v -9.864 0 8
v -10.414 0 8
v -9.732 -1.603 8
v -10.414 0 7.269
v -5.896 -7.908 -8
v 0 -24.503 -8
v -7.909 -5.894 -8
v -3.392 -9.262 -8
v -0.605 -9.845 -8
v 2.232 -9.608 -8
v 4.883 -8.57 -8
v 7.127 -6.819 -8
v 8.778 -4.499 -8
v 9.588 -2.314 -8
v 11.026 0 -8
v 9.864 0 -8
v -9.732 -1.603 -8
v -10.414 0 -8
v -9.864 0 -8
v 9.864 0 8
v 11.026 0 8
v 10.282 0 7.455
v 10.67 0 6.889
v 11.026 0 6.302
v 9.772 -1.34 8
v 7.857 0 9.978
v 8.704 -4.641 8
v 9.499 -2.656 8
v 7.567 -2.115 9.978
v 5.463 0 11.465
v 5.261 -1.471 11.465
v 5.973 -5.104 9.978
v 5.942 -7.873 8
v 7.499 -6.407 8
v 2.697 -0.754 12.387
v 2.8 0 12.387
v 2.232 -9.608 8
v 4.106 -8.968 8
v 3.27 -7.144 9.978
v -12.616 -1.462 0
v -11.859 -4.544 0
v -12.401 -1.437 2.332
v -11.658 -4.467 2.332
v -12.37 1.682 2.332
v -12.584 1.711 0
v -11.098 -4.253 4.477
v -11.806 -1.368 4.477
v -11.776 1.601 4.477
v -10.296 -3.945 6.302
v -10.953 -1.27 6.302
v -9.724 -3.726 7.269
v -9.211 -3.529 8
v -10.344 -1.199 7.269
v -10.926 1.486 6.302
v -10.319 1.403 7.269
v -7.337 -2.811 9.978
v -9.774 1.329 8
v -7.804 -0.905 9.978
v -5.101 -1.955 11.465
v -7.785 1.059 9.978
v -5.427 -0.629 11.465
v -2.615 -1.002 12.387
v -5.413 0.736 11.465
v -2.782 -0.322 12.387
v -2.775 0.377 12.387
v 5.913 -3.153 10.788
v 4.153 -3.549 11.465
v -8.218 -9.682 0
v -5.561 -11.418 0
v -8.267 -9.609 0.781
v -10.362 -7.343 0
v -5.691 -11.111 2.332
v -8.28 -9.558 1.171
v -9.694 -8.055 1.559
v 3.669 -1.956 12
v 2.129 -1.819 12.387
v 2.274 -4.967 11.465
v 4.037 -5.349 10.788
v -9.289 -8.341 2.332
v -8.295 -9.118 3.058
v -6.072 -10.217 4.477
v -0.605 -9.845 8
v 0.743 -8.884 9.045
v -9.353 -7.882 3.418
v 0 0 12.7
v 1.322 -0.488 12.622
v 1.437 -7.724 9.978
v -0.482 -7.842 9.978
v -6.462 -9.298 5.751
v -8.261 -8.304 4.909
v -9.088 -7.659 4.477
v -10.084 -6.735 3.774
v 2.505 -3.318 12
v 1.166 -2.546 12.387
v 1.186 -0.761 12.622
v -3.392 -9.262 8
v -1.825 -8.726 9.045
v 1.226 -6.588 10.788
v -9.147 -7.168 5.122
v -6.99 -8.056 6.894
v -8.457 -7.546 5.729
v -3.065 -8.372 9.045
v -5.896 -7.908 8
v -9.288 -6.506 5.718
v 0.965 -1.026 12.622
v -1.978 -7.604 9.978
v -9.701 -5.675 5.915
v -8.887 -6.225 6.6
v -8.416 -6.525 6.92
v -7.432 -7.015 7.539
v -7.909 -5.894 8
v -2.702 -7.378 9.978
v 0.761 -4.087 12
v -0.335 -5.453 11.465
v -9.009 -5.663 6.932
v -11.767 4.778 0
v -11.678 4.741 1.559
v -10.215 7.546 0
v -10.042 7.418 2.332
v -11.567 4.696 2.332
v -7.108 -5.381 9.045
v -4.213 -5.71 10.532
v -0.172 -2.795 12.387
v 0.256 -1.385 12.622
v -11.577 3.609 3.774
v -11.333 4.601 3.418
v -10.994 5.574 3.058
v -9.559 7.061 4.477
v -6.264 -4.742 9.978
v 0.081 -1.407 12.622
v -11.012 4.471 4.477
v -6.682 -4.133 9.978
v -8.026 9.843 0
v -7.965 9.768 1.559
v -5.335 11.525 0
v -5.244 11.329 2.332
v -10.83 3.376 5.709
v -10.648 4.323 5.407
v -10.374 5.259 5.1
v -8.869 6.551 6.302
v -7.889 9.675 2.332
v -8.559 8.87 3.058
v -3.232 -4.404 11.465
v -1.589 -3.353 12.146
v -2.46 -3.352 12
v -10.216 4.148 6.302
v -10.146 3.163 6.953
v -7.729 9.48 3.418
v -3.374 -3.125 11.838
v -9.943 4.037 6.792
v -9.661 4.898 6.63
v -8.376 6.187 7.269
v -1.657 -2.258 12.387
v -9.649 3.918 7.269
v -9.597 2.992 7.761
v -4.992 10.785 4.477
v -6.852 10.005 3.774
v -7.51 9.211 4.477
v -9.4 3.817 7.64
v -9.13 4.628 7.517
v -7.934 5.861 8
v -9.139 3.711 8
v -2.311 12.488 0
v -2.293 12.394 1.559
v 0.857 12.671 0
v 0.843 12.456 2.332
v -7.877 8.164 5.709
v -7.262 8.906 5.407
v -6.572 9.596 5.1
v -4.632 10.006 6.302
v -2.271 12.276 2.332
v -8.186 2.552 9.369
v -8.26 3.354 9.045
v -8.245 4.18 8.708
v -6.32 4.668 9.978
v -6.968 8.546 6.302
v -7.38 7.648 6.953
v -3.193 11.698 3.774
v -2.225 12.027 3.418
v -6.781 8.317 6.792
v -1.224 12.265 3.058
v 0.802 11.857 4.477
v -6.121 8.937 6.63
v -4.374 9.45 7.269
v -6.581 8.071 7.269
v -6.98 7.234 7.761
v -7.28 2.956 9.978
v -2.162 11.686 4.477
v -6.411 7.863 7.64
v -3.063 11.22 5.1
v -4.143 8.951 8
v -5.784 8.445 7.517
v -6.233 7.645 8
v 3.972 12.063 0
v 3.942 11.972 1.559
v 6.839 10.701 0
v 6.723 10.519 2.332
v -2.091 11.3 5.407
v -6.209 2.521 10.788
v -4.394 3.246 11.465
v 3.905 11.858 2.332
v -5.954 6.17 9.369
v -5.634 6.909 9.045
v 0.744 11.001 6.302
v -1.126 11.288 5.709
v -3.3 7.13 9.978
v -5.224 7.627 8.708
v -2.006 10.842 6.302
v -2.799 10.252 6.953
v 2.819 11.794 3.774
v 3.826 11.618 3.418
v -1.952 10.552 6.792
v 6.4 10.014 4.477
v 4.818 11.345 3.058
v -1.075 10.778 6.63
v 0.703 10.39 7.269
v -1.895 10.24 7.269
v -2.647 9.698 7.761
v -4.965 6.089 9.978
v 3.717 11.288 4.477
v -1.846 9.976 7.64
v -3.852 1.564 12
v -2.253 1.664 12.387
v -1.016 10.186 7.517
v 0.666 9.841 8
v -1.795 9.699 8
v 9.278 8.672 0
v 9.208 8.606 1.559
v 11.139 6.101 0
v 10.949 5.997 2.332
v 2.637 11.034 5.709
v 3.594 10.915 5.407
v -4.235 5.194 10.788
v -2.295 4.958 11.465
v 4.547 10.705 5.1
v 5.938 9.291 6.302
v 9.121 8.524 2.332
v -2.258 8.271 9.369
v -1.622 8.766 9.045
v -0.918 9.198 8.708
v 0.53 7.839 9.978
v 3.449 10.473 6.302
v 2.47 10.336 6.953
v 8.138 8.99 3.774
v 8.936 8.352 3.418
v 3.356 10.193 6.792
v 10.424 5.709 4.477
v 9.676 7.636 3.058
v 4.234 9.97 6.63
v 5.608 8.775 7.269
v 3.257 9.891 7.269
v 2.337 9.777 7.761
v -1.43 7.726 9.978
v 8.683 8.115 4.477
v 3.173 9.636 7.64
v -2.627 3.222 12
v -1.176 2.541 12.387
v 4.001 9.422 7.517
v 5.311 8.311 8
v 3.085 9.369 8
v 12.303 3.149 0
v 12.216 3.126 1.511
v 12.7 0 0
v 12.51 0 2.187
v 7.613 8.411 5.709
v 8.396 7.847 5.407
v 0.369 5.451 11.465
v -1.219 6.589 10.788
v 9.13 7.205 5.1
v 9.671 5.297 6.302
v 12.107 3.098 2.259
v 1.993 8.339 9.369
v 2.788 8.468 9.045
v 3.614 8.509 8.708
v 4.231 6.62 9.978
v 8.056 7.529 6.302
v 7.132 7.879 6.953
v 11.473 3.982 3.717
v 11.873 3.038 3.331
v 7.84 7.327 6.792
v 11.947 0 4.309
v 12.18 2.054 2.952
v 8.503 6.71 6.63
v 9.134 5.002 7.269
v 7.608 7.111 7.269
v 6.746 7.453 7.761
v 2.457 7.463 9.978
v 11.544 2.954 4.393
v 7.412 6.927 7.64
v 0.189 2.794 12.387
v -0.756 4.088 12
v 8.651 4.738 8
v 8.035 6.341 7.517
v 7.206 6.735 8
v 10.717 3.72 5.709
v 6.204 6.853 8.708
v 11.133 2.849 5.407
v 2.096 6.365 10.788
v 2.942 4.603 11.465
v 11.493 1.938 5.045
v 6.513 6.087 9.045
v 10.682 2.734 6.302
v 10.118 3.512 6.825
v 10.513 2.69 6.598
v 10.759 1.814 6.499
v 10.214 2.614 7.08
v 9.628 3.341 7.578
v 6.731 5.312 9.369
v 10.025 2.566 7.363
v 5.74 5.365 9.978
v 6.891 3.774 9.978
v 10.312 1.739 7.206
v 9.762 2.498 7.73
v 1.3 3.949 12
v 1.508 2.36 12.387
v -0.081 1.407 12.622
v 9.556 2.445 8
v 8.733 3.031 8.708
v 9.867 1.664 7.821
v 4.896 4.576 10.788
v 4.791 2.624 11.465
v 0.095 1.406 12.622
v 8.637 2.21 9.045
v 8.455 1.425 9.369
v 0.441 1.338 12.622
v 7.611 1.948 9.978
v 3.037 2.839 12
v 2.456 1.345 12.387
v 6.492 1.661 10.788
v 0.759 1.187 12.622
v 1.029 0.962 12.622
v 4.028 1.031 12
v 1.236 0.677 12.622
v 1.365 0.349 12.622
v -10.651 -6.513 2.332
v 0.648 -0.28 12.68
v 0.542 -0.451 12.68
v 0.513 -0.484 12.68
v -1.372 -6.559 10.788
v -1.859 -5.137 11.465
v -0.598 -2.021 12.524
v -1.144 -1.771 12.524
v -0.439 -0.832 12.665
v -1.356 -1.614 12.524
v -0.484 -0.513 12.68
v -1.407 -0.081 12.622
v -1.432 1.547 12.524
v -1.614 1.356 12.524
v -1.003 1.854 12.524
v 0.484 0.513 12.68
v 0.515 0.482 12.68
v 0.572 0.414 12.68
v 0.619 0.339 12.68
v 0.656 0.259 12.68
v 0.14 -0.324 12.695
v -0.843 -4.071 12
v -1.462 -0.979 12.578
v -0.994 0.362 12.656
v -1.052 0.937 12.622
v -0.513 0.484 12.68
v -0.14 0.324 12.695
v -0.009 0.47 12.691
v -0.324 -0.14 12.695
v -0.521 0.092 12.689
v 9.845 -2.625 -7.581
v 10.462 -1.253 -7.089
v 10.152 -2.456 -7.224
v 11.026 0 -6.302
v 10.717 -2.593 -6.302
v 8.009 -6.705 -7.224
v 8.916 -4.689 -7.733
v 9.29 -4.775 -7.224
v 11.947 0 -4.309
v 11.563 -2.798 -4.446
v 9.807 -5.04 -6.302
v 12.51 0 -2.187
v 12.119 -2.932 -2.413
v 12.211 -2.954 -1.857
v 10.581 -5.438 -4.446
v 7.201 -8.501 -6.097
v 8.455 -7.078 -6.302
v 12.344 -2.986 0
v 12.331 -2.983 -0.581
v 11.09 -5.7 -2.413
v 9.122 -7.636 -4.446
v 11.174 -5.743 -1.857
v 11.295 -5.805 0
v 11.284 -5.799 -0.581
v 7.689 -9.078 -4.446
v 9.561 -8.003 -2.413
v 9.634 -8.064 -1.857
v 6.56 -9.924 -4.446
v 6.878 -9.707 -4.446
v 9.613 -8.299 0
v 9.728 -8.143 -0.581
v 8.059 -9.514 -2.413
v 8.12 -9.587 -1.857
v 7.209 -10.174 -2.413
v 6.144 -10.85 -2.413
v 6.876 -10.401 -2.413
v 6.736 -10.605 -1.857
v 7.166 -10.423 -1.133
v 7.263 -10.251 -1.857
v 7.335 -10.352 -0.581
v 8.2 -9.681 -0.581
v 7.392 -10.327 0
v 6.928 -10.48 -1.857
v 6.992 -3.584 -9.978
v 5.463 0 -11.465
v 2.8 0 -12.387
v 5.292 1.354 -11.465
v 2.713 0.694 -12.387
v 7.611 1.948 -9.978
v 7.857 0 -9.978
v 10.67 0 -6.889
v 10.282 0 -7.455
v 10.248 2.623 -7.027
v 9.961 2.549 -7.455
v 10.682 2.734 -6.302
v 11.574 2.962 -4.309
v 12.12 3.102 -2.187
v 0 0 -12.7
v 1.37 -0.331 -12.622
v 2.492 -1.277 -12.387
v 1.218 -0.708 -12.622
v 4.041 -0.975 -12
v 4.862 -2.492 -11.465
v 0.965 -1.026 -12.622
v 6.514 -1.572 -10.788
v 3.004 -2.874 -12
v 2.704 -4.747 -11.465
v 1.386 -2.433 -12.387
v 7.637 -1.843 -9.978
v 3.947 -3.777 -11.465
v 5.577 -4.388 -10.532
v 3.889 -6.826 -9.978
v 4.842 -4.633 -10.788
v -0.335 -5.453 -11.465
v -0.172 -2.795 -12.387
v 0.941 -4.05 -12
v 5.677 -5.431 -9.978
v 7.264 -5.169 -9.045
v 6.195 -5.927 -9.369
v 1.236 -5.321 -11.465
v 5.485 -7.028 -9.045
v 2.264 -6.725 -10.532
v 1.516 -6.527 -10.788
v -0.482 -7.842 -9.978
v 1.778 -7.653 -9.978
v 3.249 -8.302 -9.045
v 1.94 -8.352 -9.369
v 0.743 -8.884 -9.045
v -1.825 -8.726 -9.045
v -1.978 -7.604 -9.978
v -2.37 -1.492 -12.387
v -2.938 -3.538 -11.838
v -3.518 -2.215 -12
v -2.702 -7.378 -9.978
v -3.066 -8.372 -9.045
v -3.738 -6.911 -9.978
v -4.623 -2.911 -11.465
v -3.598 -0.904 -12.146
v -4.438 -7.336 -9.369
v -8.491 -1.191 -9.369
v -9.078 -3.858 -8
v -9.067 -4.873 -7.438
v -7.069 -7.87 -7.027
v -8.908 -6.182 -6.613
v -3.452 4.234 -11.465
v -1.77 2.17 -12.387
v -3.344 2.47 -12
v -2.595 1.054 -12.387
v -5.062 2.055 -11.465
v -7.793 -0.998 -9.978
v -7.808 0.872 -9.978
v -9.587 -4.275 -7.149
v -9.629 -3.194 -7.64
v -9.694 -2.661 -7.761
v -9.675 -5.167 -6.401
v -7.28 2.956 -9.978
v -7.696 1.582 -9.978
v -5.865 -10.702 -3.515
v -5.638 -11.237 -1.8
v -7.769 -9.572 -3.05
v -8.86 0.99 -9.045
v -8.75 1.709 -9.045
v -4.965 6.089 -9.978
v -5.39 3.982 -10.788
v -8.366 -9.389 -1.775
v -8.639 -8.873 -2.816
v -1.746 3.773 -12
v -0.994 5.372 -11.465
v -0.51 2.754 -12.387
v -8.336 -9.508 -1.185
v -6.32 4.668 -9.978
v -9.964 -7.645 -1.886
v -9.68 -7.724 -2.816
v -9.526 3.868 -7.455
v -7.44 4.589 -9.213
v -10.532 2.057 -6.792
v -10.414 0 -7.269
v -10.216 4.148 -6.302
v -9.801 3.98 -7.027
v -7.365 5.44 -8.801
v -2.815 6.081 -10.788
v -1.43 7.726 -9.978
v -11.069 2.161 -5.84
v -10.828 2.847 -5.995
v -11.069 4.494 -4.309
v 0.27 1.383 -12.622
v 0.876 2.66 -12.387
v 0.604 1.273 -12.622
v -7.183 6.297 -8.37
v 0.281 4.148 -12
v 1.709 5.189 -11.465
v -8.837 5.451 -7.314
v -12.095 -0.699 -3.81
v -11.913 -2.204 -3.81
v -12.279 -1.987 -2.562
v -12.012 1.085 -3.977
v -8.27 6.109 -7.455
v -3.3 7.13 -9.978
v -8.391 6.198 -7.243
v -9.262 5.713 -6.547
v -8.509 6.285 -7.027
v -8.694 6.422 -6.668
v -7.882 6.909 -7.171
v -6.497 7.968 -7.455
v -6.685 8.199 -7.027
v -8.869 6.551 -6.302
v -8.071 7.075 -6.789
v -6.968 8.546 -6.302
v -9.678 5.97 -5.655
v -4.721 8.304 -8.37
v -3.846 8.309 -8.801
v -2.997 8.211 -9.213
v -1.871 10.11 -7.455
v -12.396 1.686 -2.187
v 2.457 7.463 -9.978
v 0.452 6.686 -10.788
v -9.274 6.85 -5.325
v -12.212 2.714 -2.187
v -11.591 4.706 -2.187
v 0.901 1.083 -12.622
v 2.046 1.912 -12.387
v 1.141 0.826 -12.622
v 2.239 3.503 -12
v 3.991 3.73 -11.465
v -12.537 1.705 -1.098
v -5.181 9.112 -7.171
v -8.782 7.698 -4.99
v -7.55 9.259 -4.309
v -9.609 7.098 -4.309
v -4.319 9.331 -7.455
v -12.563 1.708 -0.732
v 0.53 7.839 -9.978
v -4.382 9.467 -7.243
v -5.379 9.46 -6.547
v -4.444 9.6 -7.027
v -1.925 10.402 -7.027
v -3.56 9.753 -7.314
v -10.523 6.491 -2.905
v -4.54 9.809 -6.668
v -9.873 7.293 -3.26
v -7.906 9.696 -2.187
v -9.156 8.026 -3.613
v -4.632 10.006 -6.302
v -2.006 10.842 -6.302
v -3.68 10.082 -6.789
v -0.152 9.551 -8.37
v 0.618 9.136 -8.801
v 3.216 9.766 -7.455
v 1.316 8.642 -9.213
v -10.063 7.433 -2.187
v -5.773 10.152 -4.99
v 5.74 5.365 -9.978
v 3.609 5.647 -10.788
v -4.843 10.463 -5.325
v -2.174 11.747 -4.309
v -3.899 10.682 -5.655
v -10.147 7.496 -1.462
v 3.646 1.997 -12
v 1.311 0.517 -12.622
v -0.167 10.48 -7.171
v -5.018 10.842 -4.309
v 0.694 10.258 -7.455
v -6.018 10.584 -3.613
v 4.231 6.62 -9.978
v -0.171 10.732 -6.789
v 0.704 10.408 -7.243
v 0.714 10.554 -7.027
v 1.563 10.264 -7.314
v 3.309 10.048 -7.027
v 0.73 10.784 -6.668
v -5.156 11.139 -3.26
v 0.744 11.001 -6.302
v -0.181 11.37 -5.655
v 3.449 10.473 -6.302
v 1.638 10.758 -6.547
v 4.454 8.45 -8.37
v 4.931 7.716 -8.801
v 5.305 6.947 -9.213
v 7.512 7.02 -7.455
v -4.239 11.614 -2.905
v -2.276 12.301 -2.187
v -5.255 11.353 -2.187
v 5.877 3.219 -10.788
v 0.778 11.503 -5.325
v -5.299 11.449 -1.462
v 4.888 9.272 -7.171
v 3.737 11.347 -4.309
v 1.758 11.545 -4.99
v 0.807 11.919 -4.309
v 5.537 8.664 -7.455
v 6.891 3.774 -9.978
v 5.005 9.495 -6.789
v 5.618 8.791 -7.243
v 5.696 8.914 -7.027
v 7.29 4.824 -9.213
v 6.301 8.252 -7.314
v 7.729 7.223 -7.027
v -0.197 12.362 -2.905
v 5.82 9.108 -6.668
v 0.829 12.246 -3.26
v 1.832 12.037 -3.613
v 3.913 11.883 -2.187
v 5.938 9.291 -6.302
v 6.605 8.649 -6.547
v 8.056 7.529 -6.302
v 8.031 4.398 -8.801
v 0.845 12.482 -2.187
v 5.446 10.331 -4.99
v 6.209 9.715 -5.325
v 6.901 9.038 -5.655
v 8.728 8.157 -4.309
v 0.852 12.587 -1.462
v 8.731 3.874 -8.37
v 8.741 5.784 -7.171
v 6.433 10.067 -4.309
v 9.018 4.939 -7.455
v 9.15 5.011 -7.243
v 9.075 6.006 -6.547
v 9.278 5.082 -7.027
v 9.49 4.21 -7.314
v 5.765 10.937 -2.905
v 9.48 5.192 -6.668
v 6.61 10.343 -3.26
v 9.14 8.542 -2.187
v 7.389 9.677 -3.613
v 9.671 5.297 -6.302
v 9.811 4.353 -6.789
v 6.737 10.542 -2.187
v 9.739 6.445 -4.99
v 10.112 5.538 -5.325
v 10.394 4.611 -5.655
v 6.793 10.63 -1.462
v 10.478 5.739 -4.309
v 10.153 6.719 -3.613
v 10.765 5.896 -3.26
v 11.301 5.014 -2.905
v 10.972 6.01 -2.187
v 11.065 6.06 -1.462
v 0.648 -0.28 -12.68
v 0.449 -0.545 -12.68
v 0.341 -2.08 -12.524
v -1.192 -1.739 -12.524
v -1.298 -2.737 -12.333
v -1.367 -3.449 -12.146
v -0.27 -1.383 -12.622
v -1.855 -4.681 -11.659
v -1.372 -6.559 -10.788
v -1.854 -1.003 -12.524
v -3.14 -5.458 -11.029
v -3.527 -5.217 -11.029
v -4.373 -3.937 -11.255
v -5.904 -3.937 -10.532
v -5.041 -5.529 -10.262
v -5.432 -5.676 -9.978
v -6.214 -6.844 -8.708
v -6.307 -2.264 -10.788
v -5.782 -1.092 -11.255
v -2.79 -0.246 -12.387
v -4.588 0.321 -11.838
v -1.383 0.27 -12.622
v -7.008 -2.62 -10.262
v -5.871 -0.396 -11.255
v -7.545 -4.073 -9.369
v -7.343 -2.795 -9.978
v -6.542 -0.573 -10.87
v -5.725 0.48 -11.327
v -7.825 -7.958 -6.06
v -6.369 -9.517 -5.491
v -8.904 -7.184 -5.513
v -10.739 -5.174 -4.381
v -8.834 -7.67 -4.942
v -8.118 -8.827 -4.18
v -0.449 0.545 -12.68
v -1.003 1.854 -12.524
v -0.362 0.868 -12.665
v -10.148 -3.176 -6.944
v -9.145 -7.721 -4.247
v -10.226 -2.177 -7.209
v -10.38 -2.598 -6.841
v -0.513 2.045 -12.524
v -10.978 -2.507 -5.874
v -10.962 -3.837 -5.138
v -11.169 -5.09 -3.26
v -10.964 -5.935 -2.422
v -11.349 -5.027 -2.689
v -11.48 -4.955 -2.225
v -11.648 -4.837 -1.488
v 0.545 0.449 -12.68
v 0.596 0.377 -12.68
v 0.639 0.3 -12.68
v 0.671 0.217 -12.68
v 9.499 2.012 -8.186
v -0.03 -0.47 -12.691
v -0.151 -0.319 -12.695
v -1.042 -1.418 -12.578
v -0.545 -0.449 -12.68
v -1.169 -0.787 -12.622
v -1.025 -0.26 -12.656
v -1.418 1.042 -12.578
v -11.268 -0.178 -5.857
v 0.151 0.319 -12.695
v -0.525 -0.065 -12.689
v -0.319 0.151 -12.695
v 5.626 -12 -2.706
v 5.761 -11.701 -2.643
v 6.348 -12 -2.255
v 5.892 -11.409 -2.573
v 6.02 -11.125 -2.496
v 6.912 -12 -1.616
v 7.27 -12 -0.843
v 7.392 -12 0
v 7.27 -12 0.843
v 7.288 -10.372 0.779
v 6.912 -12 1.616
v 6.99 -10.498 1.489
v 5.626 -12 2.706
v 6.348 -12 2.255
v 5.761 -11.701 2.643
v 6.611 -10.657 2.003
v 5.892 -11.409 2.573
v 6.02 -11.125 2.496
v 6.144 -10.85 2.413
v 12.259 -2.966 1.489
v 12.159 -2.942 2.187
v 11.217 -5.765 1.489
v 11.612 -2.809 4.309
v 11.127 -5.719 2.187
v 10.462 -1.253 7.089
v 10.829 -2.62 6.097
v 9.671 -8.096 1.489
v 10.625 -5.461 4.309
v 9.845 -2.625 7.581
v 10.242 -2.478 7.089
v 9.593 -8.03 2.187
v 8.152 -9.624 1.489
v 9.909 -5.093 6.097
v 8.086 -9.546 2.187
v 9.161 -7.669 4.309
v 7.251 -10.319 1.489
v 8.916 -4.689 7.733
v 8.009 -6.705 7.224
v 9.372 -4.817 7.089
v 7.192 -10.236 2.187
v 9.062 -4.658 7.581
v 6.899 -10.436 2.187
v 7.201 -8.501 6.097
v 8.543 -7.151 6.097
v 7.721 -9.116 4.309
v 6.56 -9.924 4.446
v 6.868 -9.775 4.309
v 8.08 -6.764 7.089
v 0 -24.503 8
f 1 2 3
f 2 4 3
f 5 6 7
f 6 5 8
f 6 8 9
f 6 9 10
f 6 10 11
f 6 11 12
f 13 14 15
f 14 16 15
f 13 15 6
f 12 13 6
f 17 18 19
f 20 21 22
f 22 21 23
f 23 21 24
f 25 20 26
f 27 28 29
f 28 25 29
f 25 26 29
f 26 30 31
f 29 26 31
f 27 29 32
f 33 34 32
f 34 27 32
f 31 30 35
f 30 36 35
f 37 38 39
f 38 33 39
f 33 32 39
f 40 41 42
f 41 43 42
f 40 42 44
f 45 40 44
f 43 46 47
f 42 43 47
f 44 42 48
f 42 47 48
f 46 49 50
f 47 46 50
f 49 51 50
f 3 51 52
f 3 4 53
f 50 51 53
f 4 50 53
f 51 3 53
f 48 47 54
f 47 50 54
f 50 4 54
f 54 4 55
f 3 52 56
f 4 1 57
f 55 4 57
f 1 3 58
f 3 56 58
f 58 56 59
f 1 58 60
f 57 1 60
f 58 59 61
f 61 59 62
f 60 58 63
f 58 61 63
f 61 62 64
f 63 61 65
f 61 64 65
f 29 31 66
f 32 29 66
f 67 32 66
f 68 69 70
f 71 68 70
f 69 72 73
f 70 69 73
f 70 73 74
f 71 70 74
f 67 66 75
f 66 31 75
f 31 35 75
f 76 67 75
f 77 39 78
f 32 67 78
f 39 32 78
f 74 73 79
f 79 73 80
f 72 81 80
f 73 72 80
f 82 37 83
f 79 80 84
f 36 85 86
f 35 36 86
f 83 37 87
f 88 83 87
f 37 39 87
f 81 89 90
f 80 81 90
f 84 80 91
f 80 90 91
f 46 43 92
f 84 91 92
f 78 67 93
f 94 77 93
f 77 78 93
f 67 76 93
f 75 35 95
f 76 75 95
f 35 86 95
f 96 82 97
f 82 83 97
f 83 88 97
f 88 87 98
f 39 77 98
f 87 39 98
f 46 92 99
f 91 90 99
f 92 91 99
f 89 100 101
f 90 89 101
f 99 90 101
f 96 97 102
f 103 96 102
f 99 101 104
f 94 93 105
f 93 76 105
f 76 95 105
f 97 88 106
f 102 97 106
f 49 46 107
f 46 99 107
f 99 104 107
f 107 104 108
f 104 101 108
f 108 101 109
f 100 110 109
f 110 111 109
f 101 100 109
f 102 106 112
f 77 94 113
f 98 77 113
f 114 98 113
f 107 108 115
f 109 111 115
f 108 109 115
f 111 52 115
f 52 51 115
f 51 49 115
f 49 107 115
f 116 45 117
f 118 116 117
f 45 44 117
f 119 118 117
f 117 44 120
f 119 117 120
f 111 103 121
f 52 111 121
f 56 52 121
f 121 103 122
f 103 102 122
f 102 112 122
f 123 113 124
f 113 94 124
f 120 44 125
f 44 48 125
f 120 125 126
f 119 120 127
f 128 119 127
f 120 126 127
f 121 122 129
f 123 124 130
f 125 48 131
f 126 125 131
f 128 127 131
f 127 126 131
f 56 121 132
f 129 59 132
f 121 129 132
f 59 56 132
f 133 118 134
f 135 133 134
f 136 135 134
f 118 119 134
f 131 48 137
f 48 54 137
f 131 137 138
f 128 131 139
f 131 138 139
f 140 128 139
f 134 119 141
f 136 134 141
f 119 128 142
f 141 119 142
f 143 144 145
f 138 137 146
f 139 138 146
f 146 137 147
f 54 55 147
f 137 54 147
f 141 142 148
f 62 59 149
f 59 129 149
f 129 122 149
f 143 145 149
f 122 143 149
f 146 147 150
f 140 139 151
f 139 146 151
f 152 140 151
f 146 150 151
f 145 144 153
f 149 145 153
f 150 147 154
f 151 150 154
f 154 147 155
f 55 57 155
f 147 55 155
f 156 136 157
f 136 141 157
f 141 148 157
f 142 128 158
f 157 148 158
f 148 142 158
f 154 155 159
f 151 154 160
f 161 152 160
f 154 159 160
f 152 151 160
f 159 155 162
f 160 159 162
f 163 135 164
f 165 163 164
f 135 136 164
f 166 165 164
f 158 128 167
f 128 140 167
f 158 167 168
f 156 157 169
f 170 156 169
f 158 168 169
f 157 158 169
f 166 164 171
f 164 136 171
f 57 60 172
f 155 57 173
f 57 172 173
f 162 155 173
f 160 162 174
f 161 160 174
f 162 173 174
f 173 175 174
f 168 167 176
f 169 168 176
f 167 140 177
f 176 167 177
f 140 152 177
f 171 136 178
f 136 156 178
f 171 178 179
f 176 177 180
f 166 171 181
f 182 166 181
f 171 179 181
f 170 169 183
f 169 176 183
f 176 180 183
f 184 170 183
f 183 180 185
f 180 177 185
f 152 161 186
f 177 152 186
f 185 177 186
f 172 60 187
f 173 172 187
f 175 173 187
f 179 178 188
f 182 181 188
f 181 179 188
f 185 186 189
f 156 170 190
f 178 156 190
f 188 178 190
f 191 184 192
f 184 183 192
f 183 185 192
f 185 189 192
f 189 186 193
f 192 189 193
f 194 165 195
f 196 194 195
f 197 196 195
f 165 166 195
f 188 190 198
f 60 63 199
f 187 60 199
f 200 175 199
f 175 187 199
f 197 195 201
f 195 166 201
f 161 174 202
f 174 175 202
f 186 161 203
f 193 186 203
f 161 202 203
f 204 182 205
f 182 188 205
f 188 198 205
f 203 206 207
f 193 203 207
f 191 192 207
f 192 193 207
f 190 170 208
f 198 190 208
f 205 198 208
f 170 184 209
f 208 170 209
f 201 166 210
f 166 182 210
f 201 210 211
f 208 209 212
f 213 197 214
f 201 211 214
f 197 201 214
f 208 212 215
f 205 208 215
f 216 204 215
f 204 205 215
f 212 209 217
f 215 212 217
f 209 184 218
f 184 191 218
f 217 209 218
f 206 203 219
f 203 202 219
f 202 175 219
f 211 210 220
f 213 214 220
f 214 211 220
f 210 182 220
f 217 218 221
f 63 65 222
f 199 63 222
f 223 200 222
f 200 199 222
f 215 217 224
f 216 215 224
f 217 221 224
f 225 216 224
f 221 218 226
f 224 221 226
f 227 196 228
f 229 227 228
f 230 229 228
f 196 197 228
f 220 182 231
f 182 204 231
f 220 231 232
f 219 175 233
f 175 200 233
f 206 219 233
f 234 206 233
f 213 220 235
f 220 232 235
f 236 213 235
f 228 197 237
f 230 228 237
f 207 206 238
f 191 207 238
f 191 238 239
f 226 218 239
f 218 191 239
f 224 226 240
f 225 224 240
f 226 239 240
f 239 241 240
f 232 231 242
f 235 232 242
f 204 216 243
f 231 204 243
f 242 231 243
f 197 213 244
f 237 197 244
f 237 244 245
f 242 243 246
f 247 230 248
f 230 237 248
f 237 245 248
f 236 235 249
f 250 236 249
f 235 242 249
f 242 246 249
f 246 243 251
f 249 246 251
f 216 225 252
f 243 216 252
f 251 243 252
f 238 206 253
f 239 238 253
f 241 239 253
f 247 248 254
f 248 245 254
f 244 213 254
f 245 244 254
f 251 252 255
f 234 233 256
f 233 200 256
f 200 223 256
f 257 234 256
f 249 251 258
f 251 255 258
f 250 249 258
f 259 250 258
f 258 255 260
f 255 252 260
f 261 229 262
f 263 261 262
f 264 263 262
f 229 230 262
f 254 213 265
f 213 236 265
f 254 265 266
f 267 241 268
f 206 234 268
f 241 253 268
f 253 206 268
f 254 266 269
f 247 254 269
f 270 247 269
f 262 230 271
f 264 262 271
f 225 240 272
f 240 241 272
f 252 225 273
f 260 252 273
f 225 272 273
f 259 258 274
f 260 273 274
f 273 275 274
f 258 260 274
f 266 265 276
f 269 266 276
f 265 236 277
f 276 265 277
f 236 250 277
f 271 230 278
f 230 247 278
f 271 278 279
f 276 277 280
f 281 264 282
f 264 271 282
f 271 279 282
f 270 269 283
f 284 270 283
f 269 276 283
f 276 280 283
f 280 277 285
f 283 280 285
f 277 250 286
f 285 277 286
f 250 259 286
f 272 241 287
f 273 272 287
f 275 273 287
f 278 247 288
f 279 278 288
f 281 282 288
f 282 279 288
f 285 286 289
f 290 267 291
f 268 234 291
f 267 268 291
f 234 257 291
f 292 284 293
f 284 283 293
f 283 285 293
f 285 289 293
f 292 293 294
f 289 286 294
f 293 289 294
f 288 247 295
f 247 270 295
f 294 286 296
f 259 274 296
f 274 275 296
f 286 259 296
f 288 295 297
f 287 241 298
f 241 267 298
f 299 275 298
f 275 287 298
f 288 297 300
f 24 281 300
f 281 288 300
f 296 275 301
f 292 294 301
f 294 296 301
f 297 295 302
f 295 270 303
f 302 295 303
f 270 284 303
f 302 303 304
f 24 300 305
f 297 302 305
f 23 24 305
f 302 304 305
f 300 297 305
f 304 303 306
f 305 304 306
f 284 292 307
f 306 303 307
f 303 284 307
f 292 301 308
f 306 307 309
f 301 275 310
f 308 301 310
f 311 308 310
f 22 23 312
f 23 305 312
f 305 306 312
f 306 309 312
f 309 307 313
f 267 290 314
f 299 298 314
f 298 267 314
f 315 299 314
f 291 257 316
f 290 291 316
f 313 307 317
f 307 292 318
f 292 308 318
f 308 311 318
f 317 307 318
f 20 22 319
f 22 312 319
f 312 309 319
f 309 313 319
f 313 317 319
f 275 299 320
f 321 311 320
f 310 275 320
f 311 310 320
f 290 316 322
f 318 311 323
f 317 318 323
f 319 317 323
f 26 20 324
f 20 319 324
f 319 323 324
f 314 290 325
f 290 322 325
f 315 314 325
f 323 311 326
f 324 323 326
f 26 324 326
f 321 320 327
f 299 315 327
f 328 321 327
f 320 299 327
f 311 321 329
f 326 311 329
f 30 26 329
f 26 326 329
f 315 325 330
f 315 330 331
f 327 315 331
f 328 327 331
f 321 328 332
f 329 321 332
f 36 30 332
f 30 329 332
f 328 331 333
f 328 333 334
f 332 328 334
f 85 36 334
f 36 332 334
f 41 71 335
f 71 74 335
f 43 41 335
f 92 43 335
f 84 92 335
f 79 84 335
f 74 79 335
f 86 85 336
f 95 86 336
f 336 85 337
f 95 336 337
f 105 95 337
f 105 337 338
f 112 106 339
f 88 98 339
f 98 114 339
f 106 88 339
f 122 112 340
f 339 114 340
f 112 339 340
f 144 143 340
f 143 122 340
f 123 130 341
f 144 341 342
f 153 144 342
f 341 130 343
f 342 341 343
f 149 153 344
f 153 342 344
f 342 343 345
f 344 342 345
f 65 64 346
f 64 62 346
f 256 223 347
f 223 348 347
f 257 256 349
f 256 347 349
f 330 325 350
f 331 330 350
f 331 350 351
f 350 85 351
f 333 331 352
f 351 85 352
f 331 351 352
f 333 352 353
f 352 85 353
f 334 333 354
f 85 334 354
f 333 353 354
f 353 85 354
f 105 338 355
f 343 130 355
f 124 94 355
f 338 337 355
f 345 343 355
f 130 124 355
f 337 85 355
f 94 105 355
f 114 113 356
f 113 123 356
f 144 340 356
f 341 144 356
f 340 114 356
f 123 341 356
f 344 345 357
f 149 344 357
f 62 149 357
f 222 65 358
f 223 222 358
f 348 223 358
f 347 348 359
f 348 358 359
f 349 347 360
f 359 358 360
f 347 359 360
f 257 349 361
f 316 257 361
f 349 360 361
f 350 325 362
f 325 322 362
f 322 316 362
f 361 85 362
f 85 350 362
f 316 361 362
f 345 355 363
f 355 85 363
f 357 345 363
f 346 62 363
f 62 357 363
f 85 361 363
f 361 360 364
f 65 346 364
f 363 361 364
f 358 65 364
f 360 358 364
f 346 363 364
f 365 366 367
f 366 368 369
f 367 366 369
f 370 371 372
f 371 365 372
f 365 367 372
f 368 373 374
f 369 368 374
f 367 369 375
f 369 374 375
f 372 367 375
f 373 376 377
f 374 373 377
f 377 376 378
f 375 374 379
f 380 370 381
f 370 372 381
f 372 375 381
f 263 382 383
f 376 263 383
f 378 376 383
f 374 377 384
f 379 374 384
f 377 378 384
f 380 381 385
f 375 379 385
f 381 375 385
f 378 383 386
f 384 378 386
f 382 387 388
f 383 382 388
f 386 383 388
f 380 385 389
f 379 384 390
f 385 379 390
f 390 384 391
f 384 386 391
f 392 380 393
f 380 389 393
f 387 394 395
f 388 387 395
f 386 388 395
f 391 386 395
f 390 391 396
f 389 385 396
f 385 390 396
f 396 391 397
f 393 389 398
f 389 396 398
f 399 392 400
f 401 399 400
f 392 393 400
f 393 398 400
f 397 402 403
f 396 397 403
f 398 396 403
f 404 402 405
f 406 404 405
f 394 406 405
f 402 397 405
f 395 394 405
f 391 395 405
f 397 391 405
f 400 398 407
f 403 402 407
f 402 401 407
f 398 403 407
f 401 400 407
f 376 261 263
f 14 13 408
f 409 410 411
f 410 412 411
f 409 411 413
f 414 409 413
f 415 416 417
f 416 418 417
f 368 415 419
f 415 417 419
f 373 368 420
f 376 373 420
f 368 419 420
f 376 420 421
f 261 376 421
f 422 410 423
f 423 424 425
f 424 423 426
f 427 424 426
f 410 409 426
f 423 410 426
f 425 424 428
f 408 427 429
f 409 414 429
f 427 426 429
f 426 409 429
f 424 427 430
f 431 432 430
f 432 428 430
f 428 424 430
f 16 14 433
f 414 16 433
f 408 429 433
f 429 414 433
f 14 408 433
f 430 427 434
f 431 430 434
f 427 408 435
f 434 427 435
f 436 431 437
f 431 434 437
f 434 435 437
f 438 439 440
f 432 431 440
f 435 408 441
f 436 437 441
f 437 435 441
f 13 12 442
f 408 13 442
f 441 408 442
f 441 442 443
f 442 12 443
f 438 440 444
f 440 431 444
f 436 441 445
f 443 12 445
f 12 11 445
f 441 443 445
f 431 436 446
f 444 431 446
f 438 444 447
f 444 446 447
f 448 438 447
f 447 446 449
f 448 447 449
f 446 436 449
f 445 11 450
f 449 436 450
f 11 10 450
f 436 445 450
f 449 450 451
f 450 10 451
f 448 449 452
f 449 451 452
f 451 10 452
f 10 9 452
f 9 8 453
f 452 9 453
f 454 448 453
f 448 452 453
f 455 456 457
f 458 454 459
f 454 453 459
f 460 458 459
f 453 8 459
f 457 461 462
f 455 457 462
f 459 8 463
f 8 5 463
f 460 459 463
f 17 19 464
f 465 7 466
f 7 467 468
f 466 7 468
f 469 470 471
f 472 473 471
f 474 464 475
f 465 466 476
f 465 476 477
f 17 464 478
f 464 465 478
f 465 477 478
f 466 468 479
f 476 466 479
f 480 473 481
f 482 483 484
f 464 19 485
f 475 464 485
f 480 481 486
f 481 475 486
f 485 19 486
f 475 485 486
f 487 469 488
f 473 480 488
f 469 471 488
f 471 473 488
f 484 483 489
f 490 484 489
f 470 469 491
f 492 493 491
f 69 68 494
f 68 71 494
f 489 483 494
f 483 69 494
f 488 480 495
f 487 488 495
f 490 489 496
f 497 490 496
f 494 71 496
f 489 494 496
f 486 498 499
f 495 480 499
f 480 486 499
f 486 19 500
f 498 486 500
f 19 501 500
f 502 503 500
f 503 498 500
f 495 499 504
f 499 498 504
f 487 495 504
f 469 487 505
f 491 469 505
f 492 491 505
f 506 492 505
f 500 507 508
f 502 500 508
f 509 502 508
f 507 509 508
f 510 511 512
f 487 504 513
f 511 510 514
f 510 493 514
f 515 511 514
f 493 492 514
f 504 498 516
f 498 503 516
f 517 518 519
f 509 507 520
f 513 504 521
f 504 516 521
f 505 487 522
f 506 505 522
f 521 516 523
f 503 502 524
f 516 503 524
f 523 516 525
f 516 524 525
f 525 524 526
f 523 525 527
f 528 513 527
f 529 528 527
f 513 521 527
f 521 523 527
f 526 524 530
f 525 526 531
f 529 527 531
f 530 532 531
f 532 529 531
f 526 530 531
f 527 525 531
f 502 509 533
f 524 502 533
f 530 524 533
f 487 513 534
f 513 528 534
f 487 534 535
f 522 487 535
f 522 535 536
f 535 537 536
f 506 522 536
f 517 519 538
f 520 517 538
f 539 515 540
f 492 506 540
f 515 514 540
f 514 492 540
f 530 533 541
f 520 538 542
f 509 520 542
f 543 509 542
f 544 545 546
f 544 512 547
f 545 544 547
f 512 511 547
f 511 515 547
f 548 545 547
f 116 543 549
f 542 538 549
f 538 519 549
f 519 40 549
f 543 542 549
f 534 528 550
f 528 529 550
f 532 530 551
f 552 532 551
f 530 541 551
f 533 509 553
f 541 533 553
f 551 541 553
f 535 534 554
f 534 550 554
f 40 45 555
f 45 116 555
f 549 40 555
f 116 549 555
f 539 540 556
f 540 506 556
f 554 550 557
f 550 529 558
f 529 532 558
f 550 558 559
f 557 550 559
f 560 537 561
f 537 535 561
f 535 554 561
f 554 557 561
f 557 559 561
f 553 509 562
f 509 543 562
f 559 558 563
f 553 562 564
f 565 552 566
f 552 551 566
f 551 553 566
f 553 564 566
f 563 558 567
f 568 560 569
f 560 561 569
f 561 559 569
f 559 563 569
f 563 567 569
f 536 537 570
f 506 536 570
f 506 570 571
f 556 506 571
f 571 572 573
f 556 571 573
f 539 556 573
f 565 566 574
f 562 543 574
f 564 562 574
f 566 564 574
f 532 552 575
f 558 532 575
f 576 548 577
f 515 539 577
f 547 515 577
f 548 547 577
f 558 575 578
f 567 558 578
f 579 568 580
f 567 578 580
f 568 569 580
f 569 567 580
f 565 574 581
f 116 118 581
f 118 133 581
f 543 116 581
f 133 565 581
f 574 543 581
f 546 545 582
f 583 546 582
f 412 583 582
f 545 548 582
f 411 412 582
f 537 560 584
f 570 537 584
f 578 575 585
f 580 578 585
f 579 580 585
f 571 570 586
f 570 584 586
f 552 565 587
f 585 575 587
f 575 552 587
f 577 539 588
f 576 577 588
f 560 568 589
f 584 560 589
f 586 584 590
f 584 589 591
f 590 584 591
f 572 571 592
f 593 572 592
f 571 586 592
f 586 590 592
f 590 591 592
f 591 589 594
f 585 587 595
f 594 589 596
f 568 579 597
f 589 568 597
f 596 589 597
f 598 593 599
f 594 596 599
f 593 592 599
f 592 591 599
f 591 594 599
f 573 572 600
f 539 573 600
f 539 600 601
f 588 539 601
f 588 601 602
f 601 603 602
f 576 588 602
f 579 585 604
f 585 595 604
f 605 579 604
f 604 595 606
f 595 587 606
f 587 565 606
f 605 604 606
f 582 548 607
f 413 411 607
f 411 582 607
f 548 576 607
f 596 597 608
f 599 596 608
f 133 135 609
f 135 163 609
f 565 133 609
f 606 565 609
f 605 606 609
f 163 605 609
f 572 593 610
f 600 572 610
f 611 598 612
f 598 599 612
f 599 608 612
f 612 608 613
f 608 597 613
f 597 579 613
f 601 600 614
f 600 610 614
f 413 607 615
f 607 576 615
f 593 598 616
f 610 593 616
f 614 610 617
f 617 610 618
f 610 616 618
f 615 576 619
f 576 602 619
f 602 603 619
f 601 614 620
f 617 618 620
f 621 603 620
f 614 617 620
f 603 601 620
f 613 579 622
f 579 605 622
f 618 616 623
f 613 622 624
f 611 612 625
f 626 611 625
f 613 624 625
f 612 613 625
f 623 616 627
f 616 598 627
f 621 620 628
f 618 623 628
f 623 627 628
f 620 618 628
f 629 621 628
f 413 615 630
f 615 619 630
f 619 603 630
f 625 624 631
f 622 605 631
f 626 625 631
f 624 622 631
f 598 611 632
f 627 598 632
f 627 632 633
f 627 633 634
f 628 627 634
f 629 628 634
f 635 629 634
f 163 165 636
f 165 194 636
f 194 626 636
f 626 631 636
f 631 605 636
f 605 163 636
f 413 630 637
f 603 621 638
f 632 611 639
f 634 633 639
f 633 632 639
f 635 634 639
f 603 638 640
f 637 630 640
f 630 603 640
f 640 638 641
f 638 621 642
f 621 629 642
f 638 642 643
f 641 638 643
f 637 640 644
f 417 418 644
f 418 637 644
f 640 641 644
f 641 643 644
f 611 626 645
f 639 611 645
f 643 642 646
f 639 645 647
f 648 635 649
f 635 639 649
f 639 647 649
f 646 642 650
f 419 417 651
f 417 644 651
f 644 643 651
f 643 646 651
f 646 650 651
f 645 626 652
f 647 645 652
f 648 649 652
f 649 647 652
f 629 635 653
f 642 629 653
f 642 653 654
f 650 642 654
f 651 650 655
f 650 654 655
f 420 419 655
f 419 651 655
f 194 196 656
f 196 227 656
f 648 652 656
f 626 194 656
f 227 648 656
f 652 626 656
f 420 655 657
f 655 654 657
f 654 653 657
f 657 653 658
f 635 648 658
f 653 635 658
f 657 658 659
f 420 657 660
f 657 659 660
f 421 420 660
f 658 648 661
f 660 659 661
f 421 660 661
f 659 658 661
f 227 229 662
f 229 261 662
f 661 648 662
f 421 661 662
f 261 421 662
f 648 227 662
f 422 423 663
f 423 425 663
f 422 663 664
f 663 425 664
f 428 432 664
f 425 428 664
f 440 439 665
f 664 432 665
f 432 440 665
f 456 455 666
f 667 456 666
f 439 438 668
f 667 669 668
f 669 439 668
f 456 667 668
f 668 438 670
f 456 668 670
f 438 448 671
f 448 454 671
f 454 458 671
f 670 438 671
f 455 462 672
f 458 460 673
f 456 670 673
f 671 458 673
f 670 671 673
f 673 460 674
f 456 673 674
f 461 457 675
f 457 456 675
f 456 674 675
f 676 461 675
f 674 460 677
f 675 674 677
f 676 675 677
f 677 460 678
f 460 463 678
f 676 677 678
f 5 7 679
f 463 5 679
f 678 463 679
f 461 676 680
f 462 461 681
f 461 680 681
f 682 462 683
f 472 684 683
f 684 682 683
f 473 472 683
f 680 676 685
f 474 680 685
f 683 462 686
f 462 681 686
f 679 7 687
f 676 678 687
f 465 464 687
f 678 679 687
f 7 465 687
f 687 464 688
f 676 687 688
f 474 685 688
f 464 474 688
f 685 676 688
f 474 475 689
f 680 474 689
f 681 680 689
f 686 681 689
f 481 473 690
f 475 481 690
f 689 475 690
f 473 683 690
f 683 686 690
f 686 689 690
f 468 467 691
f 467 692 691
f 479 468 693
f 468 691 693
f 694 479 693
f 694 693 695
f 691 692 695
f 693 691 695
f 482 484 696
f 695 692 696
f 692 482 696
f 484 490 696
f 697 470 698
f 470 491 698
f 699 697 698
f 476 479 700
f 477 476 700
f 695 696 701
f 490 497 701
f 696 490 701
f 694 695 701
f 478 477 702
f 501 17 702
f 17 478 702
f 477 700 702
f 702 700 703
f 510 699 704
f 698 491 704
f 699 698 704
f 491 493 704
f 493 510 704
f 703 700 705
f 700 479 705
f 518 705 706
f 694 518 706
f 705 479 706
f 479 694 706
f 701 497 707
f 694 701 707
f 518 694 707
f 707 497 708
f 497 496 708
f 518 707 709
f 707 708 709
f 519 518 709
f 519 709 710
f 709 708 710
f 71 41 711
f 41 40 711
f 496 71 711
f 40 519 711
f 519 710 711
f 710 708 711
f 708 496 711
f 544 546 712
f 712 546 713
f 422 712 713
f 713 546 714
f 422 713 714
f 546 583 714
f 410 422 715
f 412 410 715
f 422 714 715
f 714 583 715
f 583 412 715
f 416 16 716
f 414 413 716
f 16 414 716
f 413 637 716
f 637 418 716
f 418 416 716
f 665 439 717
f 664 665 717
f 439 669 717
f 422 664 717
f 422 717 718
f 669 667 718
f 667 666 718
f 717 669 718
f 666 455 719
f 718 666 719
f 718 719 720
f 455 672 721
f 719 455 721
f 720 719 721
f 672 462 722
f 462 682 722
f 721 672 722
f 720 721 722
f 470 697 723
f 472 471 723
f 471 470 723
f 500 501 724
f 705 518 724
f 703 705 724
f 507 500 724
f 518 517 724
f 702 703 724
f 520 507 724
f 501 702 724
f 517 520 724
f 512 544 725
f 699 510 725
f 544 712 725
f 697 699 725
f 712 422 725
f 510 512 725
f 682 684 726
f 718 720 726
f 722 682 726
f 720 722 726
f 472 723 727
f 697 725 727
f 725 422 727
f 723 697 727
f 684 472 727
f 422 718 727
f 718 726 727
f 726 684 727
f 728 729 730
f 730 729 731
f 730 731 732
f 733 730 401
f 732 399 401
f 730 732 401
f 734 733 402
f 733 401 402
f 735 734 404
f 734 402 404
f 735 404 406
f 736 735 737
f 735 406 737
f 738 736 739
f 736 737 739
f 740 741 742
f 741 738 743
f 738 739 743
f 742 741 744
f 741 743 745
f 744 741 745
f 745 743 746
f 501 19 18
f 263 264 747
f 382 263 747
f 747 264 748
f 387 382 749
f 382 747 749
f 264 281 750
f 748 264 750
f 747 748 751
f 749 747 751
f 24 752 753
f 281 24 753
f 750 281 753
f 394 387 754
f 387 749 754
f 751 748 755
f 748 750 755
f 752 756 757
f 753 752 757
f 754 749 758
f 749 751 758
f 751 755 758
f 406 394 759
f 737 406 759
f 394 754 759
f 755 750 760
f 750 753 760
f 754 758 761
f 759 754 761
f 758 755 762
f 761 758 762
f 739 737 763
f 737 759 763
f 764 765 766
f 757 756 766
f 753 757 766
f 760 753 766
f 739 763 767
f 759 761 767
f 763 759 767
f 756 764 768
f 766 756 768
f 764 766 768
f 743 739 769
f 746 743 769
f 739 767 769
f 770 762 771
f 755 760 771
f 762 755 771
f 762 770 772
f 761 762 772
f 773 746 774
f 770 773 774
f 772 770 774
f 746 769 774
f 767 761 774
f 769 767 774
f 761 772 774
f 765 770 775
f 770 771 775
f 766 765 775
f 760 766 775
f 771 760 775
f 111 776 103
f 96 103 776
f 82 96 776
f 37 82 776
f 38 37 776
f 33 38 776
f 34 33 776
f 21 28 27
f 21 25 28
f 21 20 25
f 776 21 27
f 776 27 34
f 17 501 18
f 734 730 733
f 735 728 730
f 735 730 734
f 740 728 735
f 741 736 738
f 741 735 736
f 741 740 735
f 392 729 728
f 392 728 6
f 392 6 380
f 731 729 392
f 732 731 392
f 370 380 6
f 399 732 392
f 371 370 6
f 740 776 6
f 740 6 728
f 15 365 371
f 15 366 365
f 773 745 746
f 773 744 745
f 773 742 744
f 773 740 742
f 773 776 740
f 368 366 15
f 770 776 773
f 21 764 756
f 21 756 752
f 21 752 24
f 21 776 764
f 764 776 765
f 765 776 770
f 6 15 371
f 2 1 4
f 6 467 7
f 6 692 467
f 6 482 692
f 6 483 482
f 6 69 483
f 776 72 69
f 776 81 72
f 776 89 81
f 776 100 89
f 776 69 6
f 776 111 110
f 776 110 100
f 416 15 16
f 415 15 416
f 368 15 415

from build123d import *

# Parameters (mm, degrees)
F3_DEPTH = 8
F4_DEPTH = 8
F5_R     = 2.956664
F6_DEPTH = 12


with BuildPart() as f1:
    # F0 (on Front) → F1 (revolve)
    with BuildSketch(Plane.XZ):
        with BuildLine():
            ThreePointArc((0, -12.7), (8.980256, -8.980256), (12.7, 0))
            ThreePointArc((12.7, 0), (8.980256, 8.980256), (0, 12.7))
            Line((0, 12.7), (0, -12.7))
        make_face()
    revolve(axis=Axis((0, 0, 4.66028), (0, 0, -1)))

    # F2 (on Top) → F3 (join)
    with BuildSketch(Plane.XY):
        Polygon((11.026248, 0), (0, 0), (-10.413706, 0), (0, -24.502814), align=None)
    extrude(amount=F3_DEPTH)

    # F2 (on Top) → F4 (join)
    with BuildSketch(Plane.XY):
        Polygon((11.026248, 0), (0, 0), (-10.413706, 0), (0, -24.502814), align=None)
    extrude(amount=-F4_DEPTH)

    # F5 (on Front) → F6 (join)
    with BuildSketch(Plane.XZ):
        with Locations((4.435651, 0)):
            Circle(F5_R)
    extrude(amount=F6_DEPTH)


solid = f1.part
